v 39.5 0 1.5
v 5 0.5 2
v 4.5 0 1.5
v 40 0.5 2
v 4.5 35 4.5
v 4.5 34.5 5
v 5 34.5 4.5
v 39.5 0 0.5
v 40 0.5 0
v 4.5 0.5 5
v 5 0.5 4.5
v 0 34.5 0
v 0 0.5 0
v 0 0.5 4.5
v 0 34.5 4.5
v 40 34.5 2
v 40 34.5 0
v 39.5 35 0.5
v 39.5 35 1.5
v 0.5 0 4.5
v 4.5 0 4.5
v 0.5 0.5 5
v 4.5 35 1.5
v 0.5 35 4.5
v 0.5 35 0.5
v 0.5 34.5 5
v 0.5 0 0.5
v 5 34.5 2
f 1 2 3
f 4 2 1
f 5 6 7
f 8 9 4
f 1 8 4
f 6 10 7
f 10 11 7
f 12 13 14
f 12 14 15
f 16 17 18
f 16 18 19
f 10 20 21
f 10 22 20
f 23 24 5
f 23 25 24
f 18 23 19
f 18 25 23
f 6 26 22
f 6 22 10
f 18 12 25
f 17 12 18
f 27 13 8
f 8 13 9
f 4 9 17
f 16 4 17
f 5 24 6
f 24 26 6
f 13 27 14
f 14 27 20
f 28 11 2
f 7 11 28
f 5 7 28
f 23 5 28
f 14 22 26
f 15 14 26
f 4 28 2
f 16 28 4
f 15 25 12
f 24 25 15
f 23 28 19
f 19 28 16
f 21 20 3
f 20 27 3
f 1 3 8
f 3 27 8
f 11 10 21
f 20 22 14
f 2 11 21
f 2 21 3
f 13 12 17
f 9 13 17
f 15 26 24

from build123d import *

# Parameters (mm, degrees)
F0_W     = 40
F0_H     = 35
F1_DEPTH = 5
F2_W     = 35
F2_H     = 35
F3_DEPTH = 3
F4_SIZE  = 0.5


with BuildPart() as f1:
    # F0 (on Top) → F1 (new body)
    with BuildSketch(Plane.XY):
        with Locations((20, 17.5)):
            Rectangle(F0_W, F0_H)
    extrude(amount=F1_DEPTH)

    # F2 (on face) → F3 (cut)
    with BuildSketch(Plane.XY.offset(5)):
        with Locations((22.5, 17.5)):
            Rectangle(F2_W, F2_H)
    extrude(amount=-F3_DEPTH, mode=Mode.SUBTRACT)

    # F4
    f4_edges = [f1.edges().sort_by_distance(p)[0] for p in [
        (2.5, 35, 5),
        (5, 17.5, 5),
        (2.5, 0, 5),
        (0, 17.5, 5),
        (20, 0, 0),
        (40, 0, 1),
        (22.5, 0, 2),
        (5, 0, 3.5),
        (0, 0, 2.5),
        (20, 35, 0),
        (0, 35, 2.5),
        (5, 35, 3.5),
        (22.5, 35, 2),
        (40, 35, 1),
    ]]
    chamfer(f4_edges, length=F4_SIZE)


solid = f1.part
